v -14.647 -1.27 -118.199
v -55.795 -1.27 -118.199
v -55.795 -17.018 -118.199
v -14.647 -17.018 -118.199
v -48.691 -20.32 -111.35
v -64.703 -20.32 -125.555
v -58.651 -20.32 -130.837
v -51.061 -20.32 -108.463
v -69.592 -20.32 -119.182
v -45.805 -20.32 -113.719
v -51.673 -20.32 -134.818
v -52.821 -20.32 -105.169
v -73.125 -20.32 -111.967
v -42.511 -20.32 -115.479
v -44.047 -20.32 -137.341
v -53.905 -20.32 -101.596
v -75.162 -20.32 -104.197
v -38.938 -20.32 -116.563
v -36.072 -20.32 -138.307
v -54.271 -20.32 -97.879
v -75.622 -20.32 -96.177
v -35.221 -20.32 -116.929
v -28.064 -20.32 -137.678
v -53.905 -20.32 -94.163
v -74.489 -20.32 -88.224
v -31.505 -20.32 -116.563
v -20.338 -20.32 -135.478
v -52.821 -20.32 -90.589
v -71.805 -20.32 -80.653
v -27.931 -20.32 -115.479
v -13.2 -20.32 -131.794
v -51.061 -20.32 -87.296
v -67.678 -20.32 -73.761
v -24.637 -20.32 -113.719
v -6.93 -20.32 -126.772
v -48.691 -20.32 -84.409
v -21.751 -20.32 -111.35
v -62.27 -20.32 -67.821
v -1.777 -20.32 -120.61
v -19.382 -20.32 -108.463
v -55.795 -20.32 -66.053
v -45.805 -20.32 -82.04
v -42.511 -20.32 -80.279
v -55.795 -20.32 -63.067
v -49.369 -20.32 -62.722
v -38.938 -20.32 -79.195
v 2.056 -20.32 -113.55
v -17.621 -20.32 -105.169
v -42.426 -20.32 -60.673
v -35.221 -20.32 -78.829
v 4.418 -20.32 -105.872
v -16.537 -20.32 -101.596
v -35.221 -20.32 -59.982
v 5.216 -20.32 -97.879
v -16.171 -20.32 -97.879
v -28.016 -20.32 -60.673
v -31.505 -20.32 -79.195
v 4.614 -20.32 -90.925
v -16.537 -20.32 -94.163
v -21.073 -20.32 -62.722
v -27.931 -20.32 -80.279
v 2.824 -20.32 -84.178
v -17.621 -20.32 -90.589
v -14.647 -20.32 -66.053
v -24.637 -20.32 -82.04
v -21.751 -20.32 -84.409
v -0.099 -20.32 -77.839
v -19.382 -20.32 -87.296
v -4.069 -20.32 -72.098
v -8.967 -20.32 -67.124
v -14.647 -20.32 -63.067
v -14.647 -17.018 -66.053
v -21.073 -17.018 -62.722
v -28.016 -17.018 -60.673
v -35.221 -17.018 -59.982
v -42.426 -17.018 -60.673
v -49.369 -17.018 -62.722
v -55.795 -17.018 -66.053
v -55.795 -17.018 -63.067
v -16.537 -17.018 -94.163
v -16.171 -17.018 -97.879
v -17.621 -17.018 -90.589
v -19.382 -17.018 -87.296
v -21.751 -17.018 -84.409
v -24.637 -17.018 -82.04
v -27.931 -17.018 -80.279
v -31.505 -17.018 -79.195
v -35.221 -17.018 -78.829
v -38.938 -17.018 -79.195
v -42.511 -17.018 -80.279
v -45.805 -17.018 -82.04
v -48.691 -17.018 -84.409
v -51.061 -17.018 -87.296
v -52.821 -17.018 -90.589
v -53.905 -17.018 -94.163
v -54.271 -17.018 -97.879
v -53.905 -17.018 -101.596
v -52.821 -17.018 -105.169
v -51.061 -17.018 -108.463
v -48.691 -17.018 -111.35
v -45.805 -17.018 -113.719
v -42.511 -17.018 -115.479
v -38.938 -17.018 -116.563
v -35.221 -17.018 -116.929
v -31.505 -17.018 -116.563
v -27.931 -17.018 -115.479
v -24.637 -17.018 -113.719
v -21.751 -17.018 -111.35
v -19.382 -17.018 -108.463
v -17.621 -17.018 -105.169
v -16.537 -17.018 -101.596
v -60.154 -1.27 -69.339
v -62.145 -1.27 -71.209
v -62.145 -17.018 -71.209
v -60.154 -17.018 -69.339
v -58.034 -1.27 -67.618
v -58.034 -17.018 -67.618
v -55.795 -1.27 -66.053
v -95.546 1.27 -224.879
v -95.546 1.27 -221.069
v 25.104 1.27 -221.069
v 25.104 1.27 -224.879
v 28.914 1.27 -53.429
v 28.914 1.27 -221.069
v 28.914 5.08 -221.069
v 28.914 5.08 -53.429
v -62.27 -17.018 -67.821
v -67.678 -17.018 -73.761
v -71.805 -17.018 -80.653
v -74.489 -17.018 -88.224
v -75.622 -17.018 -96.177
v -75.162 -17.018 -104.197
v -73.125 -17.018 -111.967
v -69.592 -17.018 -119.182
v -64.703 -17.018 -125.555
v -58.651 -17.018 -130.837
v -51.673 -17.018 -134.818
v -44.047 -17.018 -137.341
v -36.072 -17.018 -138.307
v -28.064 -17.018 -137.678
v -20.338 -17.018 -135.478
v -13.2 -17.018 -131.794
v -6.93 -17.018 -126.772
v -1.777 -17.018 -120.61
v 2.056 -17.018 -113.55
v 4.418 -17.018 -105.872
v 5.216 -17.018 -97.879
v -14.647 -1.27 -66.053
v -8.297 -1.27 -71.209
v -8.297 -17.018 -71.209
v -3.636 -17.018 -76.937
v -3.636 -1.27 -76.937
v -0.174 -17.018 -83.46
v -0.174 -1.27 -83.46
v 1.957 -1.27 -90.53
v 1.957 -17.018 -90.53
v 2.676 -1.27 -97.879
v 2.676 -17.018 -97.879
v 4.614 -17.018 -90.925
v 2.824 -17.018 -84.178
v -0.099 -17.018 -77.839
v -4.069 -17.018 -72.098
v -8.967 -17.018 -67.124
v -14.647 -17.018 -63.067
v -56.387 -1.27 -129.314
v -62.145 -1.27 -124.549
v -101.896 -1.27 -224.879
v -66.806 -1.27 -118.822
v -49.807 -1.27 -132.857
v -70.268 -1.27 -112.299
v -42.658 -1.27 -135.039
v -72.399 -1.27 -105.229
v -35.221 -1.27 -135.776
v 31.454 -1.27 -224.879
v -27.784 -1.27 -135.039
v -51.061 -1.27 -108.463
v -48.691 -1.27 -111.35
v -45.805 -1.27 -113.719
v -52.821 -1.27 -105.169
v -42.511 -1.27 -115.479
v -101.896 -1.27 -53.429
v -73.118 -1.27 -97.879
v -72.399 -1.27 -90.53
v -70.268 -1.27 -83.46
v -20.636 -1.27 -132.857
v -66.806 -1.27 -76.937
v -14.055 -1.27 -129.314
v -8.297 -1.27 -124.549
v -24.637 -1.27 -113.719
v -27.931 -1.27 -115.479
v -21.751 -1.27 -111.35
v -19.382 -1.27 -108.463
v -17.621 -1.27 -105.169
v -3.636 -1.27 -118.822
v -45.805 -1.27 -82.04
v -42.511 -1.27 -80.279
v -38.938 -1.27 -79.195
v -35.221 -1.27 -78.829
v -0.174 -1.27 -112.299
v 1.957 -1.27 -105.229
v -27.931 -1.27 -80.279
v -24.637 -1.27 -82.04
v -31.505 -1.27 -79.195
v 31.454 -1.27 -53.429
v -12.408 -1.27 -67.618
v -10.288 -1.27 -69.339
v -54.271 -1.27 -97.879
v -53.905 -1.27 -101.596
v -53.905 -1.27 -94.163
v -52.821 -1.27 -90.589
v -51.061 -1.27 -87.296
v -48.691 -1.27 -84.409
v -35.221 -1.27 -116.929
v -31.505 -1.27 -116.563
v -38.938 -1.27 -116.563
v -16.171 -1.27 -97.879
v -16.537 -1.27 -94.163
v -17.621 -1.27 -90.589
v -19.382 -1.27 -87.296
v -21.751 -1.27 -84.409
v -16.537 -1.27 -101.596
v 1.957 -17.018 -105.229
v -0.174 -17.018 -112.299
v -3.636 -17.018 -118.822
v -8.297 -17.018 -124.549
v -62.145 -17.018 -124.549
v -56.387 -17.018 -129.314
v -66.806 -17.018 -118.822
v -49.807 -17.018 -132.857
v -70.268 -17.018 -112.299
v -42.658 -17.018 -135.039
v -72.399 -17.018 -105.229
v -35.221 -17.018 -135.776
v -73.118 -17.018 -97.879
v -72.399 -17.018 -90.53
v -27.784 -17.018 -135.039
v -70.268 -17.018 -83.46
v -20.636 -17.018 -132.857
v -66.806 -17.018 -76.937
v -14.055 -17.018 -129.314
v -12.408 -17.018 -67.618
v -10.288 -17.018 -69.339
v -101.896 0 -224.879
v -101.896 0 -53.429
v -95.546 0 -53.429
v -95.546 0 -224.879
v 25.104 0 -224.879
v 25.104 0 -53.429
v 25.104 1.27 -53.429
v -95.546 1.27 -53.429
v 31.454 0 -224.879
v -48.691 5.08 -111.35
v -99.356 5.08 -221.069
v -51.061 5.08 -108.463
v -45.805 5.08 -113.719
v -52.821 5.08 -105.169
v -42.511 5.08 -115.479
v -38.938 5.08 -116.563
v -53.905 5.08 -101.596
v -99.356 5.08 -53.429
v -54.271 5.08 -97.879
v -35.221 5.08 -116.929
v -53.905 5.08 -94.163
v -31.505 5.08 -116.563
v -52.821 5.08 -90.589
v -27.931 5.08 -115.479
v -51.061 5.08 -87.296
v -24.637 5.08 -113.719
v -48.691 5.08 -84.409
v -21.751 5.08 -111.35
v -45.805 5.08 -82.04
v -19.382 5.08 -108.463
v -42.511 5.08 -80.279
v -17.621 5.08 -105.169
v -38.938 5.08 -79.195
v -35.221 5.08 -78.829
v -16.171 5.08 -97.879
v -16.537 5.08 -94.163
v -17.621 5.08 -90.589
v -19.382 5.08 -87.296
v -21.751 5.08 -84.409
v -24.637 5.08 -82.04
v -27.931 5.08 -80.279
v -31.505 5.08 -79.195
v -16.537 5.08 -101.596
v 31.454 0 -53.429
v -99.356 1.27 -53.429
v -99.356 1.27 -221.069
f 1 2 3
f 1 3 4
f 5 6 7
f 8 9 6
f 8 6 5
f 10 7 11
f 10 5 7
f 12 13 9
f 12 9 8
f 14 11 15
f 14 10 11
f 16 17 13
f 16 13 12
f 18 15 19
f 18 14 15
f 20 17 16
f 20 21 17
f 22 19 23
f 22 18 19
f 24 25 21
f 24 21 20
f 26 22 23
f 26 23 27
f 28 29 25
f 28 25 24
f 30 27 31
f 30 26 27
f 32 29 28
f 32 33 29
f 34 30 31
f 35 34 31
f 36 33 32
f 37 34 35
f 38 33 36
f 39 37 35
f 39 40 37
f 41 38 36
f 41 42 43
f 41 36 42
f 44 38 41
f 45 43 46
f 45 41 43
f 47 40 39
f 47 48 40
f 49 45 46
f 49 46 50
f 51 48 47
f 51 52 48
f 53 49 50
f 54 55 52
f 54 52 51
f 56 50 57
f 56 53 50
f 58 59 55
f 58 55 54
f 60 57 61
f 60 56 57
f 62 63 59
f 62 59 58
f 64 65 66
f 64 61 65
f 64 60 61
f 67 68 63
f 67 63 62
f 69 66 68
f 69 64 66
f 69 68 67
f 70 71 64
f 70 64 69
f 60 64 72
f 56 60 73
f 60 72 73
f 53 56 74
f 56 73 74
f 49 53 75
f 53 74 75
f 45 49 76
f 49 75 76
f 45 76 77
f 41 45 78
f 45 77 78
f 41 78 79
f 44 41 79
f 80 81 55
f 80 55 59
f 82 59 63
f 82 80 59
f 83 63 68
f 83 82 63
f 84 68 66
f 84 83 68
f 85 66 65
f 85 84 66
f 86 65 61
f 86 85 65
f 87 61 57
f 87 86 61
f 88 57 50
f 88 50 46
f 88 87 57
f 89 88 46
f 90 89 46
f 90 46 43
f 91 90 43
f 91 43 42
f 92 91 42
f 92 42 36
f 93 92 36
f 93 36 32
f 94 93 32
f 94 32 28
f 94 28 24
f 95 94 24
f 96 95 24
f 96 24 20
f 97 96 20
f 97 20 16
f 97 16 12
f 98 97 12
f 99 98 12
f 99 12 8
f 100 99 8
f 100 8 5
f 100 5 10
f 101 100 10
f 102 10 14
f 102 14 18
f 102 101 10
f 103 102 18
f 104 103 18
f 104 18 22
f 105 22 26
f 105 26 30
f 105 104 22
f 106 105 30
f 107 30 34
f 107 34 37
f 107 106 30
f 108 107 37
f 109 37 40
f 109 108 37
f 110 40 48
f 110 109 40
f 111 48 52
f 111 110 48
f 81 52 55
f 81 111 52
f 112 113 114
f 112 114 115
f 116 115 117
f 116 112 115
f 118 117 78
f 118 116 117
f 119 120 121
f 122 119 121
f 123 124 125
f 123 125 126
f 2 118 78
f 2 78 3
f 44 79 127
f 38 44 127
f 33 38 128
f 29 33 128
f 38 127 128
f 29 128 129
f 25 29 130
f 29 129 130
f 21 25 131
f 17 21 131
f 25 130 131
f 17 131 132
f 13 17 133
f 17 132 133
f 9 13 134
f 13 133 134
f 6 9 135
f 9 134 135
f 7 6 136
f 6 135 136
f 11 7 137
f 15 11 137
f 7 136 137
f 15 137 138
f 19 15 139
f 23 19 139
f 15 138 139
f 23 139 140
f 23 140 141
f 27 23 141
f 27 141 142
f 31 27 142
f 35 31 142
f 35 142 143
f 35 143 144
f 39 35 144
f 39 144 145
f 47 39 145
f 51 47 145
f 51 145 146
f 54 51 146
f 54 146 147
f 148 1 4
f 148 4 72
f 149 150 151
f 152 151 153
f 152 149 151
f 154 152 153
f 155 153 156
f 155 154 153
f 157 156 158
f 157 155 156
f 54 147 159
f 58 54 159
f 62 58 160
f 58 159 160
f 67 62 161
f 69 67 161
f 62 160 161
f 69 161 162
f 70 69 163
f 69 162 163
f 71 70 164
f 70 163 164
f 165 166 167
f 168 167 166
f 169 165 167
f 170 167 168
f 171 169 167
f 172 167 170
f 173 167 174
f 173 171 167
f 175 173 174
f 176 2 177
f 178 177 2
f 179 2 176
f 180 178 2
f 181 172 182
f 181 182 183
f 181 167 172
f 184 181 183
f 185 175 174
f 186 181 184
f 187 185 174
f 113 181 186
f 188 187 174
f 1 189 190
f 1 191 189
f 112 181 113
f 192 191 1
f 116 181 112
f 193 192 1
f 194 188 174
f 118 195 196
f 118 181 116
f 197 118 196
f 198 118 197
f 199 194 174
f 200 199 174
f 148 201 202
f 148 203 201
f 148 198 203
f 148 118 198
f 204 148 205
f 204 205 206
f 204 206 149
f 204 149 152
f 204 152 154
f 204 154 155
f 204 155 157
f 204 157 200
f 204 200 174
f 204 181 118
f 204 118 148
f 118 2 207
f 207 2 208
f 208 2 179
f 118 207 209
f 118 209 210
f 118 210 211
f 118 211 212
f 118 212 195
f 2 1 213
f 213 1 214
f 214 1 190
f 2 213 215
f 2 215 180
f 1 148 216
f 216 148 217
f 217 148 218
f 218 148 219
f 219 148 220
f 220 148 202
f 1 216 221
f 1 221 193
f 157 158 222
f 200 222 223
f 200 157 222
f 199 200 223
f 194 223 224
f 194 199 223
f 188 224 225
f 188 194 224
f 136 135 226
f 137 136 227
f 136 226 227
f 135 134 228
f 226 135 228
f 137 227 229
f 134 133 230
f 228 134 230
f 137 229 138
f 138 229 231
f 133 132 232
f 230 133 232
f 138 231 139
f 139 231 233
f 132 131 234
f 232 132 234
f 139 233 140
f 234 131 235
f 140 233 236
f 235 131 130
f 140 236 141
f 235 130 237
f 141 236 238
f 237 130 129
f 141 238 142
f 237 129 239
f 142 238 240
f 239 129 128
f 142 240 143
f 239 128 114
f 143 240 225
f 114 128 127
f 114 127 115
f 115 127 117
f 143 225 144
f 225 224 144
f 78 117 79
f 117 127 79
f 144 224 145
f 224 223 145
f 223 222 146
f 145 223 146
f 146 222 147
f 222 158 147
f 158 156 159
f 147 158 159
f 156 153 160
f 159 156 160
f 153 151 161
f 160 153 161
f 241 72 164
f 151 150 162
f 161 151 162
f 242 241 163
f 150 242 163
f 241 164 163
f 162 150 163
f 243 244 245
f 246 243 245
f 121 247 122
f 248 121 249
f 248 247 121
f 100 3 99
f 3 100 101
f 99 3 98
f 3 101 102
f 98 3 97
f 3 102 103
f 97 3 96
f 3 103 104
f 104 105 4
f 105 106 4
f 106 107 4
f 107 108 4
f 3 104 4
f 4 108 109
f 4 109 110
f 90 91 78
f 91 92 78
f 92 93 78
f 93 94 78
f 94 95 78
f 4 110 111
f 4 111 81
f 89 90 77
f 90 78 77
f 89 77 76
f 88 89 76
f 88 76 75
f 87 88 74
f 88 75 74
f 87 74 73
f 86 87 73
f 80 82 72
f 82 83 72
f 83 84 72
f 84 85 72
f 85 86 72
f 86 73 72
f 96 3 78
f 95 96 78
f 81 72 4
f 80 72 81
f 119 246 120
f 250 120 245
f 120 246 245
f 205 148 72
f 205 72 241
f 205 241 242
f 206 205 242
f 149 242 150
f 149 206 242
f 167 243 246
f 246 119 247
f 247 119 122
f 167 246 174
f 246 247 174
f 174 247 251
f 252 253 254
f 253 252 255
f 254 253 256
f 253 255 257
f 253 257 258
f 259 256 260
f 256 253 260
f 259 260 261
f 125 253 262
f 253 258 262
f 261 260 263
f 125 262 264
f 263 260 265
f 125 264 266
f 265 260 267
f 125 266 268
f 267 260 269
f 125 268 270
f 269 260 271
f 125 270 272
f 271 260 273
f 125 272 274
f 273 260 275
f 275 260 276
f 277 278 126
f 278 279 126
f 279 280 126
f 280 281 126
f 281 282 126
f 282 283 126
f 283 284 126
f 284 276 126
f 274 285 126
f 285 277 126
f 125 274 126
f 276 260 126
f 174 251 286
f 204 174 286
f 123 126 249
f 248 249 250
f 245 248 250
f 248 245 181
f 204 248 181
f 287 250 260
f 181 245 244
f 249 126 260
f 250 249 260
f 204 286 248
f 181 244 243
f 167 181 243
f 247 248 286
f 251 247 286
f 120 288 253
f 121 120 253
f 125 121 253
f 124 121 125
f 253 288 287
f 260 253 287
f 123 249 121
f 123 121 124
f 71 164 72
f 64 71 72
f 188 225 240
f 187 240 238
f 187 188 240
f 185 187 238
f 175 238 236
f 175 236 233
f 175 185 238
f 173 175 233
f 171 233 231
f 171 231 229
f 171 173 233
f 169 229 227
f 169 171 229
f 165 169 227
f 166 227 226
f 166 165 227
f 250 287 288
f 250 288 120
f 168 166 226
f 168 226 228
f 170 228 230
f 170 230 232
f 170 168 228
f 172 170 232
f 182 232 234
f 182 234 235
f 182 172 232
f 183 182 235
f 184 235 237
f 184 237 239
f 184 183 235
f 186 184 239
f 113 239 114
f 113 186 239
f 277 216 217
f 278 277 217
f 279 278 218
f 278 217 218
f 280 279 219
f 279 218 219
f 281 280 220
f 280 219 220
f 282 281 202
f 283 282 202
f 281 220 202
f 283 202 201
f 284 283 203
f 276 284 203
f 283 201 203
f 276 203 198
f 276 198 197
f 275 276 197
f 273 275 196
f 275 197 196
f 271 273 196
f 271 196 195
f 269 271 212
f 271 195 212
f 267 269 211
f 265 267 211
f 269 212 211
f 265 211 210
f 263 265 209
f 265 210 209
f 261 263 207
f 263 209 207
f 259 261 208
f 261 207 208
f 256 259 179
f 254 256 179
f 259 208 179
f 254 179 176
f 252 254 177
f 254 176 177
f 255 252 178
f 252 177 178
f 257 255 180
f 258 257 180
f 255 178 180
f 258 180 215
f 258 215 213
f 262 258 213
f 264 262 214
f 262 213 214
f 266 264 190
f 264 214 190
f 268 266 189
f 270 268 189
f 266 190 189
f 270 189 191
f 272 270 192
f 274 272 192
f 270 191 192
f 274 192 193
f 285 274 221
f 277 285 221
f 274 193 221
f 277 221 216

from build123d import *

# Parameters (mm, degrees)
F0_W     = 3.81
F0_H     = 167.64
F0_W_2   = 120.65
F1_DEPTH = 5.08
F0_H_2   = 3.81
F2_DEPTH = 1.27
F3_DEPTH = 1.27
F4_DEPTH = 1.27
F5_W     = 41.148
F5_H     = 6.35
F5_H_2   = 40.64
F5_R     = 19.05
F6_DEPTH = 19.05
F7_DEPTH = 15.748
F8_DEPTH = 6.35


with BuildPart() as f1:
    # F0 (on Front) → F1 (new body)
    with BuildSketch(Plane.XZ):
        with Locations((-97.4510958609, -137.2491913055)):
            Rectangle(F0_W, F0_H)
        with Locations((-35.2210958609, -137.2491913055)):
            Rectangle(F0_W_2, F0_H)
        with Locations((27.0089041391, -137.2491913055)):
            Rectangle(F0_W, F0_H)
    extrude(amount=-F1_DEPTH)

    # F0 (on Front) → F2 (join)
    with BuildSketch(Plane.XZ):
        with Locations((-35.2210958609, -222.9741913055)):
            Rectangle(F0_W_2, F0_H_2)
    extrude(amount=-F2_DEPTH)

    # F0 (on Front) → F3 (cut)
    with BuildSketch(Plane.XZ):
        with Locations((-97.4510958609, -137.2491913055)):
            Rectangle(F0_W, F0_H)
        with Locations((27.0089041391, -137.2491913055)):
            Rectangle(F0_W, F0_H)
    extrude(amount=-F3_DEPTH, mode=Mode.SUBTRACT)

    # F0 (on Front) → F4 (join)
    with BuildSketch(Plane.XZ):
        Polygon((-99.3560958609, -221.0691913055), (-99.3560958609, -53.4291913055), (-101.8960958609, -53.4291913055), (-101.8960958609, -224.8791913055), (-95.5460958609, -224.8791913055), (-95.5460958609, -221.0691913055), align=None)
        with Locations((-97.4510958609, -137.2491913055)):
            Rectangle(F0_W, F0_H)
        with Locations((-35.2210958609, -137.2491913055)):
            Rectangle(F0_W_2, F0_H)
        with Locations((-35.2210958609, -222.9741913055)):
            Rectangle(F0_W_2, F0_H_2)
        with Locations((27.0089041391, -137.2491913055)):
            Rectangle(F0_W, F0_H)
        Polygon((31.4539041391, -53.4291913055), (28.9139041391, -53.4291913055), (28.9139041391, -221.0691913055), (25.1039041391, -221.0691913055), (25.1039041391, -224.8791913055), (31.4539041391, -224.8791913055), align=None)
    extrude(amount=F4_DEPTH)

    # F5 (on face) → F6 (join)
    with BuildSketch(Plane.XZ.offset(1.27)):
        with BuildLine():
            Line((-14.6470958609, -71.2091913055), (-14.6470958609, -66.0530825267))
            ThreePointArc((-14.6470958609, -66.0530825267), (-35.2210958609, -59.9820848724), (-55.7950958609, -66.0530825267))
            Line((-55.7950958609, -66.0530825267), (-55.7950958609, -71.2091913055))
            Line((-55.7950958609, -71.2091913055), (-14.6470958609, -71.2091913055))
        make_face()
        with Locations((-35.2210958609, -74.3841913055)):
            Rectangle(F5_W, F5_H)
        with Locations((-35.2210958609, -97.8791913055)):
            Rectangle(F5_W, F5_H_2)
        with Locations((-35.2210958609, -97.8791913055)):
            Circle(F5_R, mode=Mode.SUBTRACT)
        with BuildLine():
            Line((-55.7950958609, -71.2091913055), (-55.7950958609, -66.0530825267))
            ThreePointArc((-55.7950958609, -66.0530825267), (-59.109615393, -68.4593117924), (-62.1450958609, -71.2091913055))
            Line((-62.1450958609, -71.2091913055), (-55.7950958609, -71.2091913055))
        make_face()
        with BuildLine():
            ThreePointArc((-62.1450958609, -71.2091913055), (-73.118202294, -97.8791913055), (-62.1450958609, -124.5491913055))
            Line((-62.1450958609, -124.5491913055), (-62.1450958609, -71.2091913055))
        make_face()
        with BuildLine():
            Line((-14.6470958609, -71.2091913055), (-8.2970958609, -71.2091913055))
            ThreePointArc((-8.2970958609, -71.2091913055), (-11.3325763288, -68.4593117924), (-14.6470958609, -66.0530825267))
            Line((-14.6470958609, -66.0530825267), (-14.6470958609, -71.2091913055))
        make_face()
        Polygon((-8.2970958609, -124.5491913055), (-8.2970958609, -71.2091913055), (-14.6470958609, -71.2091913055), (-14.6470958609, -77.5591913055), (-14.6470958609, -118.1991913055), (-55.7950958609, -118.1991913055), (-55.7950958609, -77.5591913055), (-55.7950958609, -71.2091913055), (-62.1450958609, -71.2091913055), (-62.1450958609, -124.5491913055), align=None)
        with BuildLine():
            ThreePointArc((-8.2970958609, -124.5491913055), (-0.1744671385, -112.298778373), (2.6760105722, -97.8791913055))
            ThreePointArc((2.6760105722, -97.8791913055), (-0.1744671385, -83.459604238), (-8.2970958609, -71.2091913055))
            Line((-8.2970958609, -71.2091913055), (-8.2970958609, -124.5491913055))
        make_face()
        with BuildLine():
            ThreePointArc((-62.1450958609, -124.5491913055), (-35.2210958609, -135.7762977386), (-8.2970958609, -124.5491913055))
            Line((-8.2970958609, -124.5491913055), (-62.1450958609, -124.5491913055))
        make_face()
        with BuildLine():
            ThreePointArc((-8.2970958609, -71.2091913055), (-0.1744671385, -83.459604238), (2.6760105722, -97.8791913055))
            ThreePointArc((2.6760105722, -97.8791913055), (-0.1744671385, -112.298778373), (-8.2970958609, -124.5491913055))
            ThreePointArc((-8.2970958609, -124.5491913055), (-35.2210958609, -135.7762977386), (-62.1450958609, -124.5491913055))
            ThreePointArc((-62.1450958609, -124.5491913055), (-73.118202294, -97.8791913055), (-62.1450958609, -71.2091913055))
            ThreePointArc((-62.1450958609, -71.2091913055), (-59.109615393, -68.4593117924), (-55.7950958609, -66.0530825267))
            Line((-55.7950958609, -66.0530825267), (-55.7950958609, -63.0672666147))
            ThreePointArc((-55.7950958609, -63.0672666147), (-55.2611376389, -133.0012114954), (5.2160105722, -97.8791913055))
            ThreePointArc((5.2160105722, -97.8791913055), (-0.099075671, -77.8391495275), (-14.6470958609, -63.0672666147))
            Line((-14.6470958609, -63.0672666147), (-14.6470958609, -66.0530825267))
            ThreePointArc((-14.6470958609, -66.0530825267), (-11.3325763288, -68.4593117924), (-8.2970958609, -71.2091913055))
        make_face()
    extrude(amount=F6_DEPTH)

    # F5 (on face) → F7 (cut)
    with BuildSketch(Plane.XZ.offset(1.27)):
        with Locations((-35.2210958609, -97.8791913055)):
            Rectangle(F5_W, F5_H_2)
        with Locations((-35.2210958609, -97.8791913055)):
            Circle(F5_R, mode=Mode.SUBTRACT)
        with Locations((-35.2210958609, -74.3841913055)):
            Rectangle(F5_W, F5_H)
        with BuildLine():
            Line((-14.6470958609, -71.2091913055), (-14.6470958609, -66.0530825267))
            ThreePointArc((-14.6470958609, -66.0530825267), (-35.2210958609, -59.9820848724), (-55.7950958609, -66.0530825267))
            Line((-55.7950958609, -66.0530825267), (-55.7950958609, -71.2091913055))
            Line((-55.7950958609, -71.2091913055), (-14.6470958609, -71.2091913055))
        make_face()
        with BuildLine():
            ThreePointArc((-55.7950958609, -66.0530825267), (-35.2210958609, -59.9820848724), (-14.6470958609, -66.0530825267))
            Line((-14.6470958609, -66.0530825267), (-14.6470958609, -63.0672666147))
            ThreePointArc((-14.6470958609, -63.0672666147), (-35.2210958609, -57.4420848724), (-55.7950958609, -63.0672666147))
            Line((-55.7950958609, -63.0672666147), (-55.7950958609, -66.0530825267))
        make_face()
        with BuildLine():
            ThreePointArc((-8.2970958609, -71.2091913055), (-0.1744671385, -83.459604238), (2.6760105722, -97.8791913055))
            ThreePointArc((2.6760105722, -97.8791913055), (-0.1744671385, -112.298778373), (-8.2970958609, -124.5491913055))
            ThreePointArc((-8.2970958609, -124.5491913055), (-35.2210958609, -135.7762977386), (-62.1450958609, -124.5491913055))
            ThreePointArc((-62.1450958609, -124.5491913055), (-73.118202294, -97.8791913055), (-62.1450958609, -71.2091913055))
            ThreePointArc((-62.1450958609, -71.2091913055), (-59.109615393, -68.4593117924), (-55.7950958609, -66.0530825267))
            Line((-55.7950958609, -66.0530825267), (-55.7950958609, -63.0672666147))
            ThreePointArc((-55.7950958609, -63.0672666147), (-55.2611376389, -133.0012114954), (5.2160105722, -97.8791913055))
            ThreePointArc((5.2160105722, -97.8791913055), (-0.099075671, -77.8391495275), (-14.6470958609, -63.0672666147))
            Line((-14.6470958609, -63.0672666147), (-14.6470958609, -66.0530825267))
            ThreePointArc((-14.6470958609, -66.0530825267), (-11.3325763288, -68.4593117924), (-8.2970958609, -71.2091913055))
        make_face()
    extrude(amount=F7_DEPTH, mode=Mode.SUBTRACT)

    # F5 (on face) → F8 (cut)
    with BuildSketch(Plane.XZ.offset(1.27)):
        with Locations((-35.2210958609, -97.8791913055)):
            Circle(F5_R)
    extrude(amount=-F8_DEPTH, mode=Mode.SUBTRACT)


solid = f1.part
